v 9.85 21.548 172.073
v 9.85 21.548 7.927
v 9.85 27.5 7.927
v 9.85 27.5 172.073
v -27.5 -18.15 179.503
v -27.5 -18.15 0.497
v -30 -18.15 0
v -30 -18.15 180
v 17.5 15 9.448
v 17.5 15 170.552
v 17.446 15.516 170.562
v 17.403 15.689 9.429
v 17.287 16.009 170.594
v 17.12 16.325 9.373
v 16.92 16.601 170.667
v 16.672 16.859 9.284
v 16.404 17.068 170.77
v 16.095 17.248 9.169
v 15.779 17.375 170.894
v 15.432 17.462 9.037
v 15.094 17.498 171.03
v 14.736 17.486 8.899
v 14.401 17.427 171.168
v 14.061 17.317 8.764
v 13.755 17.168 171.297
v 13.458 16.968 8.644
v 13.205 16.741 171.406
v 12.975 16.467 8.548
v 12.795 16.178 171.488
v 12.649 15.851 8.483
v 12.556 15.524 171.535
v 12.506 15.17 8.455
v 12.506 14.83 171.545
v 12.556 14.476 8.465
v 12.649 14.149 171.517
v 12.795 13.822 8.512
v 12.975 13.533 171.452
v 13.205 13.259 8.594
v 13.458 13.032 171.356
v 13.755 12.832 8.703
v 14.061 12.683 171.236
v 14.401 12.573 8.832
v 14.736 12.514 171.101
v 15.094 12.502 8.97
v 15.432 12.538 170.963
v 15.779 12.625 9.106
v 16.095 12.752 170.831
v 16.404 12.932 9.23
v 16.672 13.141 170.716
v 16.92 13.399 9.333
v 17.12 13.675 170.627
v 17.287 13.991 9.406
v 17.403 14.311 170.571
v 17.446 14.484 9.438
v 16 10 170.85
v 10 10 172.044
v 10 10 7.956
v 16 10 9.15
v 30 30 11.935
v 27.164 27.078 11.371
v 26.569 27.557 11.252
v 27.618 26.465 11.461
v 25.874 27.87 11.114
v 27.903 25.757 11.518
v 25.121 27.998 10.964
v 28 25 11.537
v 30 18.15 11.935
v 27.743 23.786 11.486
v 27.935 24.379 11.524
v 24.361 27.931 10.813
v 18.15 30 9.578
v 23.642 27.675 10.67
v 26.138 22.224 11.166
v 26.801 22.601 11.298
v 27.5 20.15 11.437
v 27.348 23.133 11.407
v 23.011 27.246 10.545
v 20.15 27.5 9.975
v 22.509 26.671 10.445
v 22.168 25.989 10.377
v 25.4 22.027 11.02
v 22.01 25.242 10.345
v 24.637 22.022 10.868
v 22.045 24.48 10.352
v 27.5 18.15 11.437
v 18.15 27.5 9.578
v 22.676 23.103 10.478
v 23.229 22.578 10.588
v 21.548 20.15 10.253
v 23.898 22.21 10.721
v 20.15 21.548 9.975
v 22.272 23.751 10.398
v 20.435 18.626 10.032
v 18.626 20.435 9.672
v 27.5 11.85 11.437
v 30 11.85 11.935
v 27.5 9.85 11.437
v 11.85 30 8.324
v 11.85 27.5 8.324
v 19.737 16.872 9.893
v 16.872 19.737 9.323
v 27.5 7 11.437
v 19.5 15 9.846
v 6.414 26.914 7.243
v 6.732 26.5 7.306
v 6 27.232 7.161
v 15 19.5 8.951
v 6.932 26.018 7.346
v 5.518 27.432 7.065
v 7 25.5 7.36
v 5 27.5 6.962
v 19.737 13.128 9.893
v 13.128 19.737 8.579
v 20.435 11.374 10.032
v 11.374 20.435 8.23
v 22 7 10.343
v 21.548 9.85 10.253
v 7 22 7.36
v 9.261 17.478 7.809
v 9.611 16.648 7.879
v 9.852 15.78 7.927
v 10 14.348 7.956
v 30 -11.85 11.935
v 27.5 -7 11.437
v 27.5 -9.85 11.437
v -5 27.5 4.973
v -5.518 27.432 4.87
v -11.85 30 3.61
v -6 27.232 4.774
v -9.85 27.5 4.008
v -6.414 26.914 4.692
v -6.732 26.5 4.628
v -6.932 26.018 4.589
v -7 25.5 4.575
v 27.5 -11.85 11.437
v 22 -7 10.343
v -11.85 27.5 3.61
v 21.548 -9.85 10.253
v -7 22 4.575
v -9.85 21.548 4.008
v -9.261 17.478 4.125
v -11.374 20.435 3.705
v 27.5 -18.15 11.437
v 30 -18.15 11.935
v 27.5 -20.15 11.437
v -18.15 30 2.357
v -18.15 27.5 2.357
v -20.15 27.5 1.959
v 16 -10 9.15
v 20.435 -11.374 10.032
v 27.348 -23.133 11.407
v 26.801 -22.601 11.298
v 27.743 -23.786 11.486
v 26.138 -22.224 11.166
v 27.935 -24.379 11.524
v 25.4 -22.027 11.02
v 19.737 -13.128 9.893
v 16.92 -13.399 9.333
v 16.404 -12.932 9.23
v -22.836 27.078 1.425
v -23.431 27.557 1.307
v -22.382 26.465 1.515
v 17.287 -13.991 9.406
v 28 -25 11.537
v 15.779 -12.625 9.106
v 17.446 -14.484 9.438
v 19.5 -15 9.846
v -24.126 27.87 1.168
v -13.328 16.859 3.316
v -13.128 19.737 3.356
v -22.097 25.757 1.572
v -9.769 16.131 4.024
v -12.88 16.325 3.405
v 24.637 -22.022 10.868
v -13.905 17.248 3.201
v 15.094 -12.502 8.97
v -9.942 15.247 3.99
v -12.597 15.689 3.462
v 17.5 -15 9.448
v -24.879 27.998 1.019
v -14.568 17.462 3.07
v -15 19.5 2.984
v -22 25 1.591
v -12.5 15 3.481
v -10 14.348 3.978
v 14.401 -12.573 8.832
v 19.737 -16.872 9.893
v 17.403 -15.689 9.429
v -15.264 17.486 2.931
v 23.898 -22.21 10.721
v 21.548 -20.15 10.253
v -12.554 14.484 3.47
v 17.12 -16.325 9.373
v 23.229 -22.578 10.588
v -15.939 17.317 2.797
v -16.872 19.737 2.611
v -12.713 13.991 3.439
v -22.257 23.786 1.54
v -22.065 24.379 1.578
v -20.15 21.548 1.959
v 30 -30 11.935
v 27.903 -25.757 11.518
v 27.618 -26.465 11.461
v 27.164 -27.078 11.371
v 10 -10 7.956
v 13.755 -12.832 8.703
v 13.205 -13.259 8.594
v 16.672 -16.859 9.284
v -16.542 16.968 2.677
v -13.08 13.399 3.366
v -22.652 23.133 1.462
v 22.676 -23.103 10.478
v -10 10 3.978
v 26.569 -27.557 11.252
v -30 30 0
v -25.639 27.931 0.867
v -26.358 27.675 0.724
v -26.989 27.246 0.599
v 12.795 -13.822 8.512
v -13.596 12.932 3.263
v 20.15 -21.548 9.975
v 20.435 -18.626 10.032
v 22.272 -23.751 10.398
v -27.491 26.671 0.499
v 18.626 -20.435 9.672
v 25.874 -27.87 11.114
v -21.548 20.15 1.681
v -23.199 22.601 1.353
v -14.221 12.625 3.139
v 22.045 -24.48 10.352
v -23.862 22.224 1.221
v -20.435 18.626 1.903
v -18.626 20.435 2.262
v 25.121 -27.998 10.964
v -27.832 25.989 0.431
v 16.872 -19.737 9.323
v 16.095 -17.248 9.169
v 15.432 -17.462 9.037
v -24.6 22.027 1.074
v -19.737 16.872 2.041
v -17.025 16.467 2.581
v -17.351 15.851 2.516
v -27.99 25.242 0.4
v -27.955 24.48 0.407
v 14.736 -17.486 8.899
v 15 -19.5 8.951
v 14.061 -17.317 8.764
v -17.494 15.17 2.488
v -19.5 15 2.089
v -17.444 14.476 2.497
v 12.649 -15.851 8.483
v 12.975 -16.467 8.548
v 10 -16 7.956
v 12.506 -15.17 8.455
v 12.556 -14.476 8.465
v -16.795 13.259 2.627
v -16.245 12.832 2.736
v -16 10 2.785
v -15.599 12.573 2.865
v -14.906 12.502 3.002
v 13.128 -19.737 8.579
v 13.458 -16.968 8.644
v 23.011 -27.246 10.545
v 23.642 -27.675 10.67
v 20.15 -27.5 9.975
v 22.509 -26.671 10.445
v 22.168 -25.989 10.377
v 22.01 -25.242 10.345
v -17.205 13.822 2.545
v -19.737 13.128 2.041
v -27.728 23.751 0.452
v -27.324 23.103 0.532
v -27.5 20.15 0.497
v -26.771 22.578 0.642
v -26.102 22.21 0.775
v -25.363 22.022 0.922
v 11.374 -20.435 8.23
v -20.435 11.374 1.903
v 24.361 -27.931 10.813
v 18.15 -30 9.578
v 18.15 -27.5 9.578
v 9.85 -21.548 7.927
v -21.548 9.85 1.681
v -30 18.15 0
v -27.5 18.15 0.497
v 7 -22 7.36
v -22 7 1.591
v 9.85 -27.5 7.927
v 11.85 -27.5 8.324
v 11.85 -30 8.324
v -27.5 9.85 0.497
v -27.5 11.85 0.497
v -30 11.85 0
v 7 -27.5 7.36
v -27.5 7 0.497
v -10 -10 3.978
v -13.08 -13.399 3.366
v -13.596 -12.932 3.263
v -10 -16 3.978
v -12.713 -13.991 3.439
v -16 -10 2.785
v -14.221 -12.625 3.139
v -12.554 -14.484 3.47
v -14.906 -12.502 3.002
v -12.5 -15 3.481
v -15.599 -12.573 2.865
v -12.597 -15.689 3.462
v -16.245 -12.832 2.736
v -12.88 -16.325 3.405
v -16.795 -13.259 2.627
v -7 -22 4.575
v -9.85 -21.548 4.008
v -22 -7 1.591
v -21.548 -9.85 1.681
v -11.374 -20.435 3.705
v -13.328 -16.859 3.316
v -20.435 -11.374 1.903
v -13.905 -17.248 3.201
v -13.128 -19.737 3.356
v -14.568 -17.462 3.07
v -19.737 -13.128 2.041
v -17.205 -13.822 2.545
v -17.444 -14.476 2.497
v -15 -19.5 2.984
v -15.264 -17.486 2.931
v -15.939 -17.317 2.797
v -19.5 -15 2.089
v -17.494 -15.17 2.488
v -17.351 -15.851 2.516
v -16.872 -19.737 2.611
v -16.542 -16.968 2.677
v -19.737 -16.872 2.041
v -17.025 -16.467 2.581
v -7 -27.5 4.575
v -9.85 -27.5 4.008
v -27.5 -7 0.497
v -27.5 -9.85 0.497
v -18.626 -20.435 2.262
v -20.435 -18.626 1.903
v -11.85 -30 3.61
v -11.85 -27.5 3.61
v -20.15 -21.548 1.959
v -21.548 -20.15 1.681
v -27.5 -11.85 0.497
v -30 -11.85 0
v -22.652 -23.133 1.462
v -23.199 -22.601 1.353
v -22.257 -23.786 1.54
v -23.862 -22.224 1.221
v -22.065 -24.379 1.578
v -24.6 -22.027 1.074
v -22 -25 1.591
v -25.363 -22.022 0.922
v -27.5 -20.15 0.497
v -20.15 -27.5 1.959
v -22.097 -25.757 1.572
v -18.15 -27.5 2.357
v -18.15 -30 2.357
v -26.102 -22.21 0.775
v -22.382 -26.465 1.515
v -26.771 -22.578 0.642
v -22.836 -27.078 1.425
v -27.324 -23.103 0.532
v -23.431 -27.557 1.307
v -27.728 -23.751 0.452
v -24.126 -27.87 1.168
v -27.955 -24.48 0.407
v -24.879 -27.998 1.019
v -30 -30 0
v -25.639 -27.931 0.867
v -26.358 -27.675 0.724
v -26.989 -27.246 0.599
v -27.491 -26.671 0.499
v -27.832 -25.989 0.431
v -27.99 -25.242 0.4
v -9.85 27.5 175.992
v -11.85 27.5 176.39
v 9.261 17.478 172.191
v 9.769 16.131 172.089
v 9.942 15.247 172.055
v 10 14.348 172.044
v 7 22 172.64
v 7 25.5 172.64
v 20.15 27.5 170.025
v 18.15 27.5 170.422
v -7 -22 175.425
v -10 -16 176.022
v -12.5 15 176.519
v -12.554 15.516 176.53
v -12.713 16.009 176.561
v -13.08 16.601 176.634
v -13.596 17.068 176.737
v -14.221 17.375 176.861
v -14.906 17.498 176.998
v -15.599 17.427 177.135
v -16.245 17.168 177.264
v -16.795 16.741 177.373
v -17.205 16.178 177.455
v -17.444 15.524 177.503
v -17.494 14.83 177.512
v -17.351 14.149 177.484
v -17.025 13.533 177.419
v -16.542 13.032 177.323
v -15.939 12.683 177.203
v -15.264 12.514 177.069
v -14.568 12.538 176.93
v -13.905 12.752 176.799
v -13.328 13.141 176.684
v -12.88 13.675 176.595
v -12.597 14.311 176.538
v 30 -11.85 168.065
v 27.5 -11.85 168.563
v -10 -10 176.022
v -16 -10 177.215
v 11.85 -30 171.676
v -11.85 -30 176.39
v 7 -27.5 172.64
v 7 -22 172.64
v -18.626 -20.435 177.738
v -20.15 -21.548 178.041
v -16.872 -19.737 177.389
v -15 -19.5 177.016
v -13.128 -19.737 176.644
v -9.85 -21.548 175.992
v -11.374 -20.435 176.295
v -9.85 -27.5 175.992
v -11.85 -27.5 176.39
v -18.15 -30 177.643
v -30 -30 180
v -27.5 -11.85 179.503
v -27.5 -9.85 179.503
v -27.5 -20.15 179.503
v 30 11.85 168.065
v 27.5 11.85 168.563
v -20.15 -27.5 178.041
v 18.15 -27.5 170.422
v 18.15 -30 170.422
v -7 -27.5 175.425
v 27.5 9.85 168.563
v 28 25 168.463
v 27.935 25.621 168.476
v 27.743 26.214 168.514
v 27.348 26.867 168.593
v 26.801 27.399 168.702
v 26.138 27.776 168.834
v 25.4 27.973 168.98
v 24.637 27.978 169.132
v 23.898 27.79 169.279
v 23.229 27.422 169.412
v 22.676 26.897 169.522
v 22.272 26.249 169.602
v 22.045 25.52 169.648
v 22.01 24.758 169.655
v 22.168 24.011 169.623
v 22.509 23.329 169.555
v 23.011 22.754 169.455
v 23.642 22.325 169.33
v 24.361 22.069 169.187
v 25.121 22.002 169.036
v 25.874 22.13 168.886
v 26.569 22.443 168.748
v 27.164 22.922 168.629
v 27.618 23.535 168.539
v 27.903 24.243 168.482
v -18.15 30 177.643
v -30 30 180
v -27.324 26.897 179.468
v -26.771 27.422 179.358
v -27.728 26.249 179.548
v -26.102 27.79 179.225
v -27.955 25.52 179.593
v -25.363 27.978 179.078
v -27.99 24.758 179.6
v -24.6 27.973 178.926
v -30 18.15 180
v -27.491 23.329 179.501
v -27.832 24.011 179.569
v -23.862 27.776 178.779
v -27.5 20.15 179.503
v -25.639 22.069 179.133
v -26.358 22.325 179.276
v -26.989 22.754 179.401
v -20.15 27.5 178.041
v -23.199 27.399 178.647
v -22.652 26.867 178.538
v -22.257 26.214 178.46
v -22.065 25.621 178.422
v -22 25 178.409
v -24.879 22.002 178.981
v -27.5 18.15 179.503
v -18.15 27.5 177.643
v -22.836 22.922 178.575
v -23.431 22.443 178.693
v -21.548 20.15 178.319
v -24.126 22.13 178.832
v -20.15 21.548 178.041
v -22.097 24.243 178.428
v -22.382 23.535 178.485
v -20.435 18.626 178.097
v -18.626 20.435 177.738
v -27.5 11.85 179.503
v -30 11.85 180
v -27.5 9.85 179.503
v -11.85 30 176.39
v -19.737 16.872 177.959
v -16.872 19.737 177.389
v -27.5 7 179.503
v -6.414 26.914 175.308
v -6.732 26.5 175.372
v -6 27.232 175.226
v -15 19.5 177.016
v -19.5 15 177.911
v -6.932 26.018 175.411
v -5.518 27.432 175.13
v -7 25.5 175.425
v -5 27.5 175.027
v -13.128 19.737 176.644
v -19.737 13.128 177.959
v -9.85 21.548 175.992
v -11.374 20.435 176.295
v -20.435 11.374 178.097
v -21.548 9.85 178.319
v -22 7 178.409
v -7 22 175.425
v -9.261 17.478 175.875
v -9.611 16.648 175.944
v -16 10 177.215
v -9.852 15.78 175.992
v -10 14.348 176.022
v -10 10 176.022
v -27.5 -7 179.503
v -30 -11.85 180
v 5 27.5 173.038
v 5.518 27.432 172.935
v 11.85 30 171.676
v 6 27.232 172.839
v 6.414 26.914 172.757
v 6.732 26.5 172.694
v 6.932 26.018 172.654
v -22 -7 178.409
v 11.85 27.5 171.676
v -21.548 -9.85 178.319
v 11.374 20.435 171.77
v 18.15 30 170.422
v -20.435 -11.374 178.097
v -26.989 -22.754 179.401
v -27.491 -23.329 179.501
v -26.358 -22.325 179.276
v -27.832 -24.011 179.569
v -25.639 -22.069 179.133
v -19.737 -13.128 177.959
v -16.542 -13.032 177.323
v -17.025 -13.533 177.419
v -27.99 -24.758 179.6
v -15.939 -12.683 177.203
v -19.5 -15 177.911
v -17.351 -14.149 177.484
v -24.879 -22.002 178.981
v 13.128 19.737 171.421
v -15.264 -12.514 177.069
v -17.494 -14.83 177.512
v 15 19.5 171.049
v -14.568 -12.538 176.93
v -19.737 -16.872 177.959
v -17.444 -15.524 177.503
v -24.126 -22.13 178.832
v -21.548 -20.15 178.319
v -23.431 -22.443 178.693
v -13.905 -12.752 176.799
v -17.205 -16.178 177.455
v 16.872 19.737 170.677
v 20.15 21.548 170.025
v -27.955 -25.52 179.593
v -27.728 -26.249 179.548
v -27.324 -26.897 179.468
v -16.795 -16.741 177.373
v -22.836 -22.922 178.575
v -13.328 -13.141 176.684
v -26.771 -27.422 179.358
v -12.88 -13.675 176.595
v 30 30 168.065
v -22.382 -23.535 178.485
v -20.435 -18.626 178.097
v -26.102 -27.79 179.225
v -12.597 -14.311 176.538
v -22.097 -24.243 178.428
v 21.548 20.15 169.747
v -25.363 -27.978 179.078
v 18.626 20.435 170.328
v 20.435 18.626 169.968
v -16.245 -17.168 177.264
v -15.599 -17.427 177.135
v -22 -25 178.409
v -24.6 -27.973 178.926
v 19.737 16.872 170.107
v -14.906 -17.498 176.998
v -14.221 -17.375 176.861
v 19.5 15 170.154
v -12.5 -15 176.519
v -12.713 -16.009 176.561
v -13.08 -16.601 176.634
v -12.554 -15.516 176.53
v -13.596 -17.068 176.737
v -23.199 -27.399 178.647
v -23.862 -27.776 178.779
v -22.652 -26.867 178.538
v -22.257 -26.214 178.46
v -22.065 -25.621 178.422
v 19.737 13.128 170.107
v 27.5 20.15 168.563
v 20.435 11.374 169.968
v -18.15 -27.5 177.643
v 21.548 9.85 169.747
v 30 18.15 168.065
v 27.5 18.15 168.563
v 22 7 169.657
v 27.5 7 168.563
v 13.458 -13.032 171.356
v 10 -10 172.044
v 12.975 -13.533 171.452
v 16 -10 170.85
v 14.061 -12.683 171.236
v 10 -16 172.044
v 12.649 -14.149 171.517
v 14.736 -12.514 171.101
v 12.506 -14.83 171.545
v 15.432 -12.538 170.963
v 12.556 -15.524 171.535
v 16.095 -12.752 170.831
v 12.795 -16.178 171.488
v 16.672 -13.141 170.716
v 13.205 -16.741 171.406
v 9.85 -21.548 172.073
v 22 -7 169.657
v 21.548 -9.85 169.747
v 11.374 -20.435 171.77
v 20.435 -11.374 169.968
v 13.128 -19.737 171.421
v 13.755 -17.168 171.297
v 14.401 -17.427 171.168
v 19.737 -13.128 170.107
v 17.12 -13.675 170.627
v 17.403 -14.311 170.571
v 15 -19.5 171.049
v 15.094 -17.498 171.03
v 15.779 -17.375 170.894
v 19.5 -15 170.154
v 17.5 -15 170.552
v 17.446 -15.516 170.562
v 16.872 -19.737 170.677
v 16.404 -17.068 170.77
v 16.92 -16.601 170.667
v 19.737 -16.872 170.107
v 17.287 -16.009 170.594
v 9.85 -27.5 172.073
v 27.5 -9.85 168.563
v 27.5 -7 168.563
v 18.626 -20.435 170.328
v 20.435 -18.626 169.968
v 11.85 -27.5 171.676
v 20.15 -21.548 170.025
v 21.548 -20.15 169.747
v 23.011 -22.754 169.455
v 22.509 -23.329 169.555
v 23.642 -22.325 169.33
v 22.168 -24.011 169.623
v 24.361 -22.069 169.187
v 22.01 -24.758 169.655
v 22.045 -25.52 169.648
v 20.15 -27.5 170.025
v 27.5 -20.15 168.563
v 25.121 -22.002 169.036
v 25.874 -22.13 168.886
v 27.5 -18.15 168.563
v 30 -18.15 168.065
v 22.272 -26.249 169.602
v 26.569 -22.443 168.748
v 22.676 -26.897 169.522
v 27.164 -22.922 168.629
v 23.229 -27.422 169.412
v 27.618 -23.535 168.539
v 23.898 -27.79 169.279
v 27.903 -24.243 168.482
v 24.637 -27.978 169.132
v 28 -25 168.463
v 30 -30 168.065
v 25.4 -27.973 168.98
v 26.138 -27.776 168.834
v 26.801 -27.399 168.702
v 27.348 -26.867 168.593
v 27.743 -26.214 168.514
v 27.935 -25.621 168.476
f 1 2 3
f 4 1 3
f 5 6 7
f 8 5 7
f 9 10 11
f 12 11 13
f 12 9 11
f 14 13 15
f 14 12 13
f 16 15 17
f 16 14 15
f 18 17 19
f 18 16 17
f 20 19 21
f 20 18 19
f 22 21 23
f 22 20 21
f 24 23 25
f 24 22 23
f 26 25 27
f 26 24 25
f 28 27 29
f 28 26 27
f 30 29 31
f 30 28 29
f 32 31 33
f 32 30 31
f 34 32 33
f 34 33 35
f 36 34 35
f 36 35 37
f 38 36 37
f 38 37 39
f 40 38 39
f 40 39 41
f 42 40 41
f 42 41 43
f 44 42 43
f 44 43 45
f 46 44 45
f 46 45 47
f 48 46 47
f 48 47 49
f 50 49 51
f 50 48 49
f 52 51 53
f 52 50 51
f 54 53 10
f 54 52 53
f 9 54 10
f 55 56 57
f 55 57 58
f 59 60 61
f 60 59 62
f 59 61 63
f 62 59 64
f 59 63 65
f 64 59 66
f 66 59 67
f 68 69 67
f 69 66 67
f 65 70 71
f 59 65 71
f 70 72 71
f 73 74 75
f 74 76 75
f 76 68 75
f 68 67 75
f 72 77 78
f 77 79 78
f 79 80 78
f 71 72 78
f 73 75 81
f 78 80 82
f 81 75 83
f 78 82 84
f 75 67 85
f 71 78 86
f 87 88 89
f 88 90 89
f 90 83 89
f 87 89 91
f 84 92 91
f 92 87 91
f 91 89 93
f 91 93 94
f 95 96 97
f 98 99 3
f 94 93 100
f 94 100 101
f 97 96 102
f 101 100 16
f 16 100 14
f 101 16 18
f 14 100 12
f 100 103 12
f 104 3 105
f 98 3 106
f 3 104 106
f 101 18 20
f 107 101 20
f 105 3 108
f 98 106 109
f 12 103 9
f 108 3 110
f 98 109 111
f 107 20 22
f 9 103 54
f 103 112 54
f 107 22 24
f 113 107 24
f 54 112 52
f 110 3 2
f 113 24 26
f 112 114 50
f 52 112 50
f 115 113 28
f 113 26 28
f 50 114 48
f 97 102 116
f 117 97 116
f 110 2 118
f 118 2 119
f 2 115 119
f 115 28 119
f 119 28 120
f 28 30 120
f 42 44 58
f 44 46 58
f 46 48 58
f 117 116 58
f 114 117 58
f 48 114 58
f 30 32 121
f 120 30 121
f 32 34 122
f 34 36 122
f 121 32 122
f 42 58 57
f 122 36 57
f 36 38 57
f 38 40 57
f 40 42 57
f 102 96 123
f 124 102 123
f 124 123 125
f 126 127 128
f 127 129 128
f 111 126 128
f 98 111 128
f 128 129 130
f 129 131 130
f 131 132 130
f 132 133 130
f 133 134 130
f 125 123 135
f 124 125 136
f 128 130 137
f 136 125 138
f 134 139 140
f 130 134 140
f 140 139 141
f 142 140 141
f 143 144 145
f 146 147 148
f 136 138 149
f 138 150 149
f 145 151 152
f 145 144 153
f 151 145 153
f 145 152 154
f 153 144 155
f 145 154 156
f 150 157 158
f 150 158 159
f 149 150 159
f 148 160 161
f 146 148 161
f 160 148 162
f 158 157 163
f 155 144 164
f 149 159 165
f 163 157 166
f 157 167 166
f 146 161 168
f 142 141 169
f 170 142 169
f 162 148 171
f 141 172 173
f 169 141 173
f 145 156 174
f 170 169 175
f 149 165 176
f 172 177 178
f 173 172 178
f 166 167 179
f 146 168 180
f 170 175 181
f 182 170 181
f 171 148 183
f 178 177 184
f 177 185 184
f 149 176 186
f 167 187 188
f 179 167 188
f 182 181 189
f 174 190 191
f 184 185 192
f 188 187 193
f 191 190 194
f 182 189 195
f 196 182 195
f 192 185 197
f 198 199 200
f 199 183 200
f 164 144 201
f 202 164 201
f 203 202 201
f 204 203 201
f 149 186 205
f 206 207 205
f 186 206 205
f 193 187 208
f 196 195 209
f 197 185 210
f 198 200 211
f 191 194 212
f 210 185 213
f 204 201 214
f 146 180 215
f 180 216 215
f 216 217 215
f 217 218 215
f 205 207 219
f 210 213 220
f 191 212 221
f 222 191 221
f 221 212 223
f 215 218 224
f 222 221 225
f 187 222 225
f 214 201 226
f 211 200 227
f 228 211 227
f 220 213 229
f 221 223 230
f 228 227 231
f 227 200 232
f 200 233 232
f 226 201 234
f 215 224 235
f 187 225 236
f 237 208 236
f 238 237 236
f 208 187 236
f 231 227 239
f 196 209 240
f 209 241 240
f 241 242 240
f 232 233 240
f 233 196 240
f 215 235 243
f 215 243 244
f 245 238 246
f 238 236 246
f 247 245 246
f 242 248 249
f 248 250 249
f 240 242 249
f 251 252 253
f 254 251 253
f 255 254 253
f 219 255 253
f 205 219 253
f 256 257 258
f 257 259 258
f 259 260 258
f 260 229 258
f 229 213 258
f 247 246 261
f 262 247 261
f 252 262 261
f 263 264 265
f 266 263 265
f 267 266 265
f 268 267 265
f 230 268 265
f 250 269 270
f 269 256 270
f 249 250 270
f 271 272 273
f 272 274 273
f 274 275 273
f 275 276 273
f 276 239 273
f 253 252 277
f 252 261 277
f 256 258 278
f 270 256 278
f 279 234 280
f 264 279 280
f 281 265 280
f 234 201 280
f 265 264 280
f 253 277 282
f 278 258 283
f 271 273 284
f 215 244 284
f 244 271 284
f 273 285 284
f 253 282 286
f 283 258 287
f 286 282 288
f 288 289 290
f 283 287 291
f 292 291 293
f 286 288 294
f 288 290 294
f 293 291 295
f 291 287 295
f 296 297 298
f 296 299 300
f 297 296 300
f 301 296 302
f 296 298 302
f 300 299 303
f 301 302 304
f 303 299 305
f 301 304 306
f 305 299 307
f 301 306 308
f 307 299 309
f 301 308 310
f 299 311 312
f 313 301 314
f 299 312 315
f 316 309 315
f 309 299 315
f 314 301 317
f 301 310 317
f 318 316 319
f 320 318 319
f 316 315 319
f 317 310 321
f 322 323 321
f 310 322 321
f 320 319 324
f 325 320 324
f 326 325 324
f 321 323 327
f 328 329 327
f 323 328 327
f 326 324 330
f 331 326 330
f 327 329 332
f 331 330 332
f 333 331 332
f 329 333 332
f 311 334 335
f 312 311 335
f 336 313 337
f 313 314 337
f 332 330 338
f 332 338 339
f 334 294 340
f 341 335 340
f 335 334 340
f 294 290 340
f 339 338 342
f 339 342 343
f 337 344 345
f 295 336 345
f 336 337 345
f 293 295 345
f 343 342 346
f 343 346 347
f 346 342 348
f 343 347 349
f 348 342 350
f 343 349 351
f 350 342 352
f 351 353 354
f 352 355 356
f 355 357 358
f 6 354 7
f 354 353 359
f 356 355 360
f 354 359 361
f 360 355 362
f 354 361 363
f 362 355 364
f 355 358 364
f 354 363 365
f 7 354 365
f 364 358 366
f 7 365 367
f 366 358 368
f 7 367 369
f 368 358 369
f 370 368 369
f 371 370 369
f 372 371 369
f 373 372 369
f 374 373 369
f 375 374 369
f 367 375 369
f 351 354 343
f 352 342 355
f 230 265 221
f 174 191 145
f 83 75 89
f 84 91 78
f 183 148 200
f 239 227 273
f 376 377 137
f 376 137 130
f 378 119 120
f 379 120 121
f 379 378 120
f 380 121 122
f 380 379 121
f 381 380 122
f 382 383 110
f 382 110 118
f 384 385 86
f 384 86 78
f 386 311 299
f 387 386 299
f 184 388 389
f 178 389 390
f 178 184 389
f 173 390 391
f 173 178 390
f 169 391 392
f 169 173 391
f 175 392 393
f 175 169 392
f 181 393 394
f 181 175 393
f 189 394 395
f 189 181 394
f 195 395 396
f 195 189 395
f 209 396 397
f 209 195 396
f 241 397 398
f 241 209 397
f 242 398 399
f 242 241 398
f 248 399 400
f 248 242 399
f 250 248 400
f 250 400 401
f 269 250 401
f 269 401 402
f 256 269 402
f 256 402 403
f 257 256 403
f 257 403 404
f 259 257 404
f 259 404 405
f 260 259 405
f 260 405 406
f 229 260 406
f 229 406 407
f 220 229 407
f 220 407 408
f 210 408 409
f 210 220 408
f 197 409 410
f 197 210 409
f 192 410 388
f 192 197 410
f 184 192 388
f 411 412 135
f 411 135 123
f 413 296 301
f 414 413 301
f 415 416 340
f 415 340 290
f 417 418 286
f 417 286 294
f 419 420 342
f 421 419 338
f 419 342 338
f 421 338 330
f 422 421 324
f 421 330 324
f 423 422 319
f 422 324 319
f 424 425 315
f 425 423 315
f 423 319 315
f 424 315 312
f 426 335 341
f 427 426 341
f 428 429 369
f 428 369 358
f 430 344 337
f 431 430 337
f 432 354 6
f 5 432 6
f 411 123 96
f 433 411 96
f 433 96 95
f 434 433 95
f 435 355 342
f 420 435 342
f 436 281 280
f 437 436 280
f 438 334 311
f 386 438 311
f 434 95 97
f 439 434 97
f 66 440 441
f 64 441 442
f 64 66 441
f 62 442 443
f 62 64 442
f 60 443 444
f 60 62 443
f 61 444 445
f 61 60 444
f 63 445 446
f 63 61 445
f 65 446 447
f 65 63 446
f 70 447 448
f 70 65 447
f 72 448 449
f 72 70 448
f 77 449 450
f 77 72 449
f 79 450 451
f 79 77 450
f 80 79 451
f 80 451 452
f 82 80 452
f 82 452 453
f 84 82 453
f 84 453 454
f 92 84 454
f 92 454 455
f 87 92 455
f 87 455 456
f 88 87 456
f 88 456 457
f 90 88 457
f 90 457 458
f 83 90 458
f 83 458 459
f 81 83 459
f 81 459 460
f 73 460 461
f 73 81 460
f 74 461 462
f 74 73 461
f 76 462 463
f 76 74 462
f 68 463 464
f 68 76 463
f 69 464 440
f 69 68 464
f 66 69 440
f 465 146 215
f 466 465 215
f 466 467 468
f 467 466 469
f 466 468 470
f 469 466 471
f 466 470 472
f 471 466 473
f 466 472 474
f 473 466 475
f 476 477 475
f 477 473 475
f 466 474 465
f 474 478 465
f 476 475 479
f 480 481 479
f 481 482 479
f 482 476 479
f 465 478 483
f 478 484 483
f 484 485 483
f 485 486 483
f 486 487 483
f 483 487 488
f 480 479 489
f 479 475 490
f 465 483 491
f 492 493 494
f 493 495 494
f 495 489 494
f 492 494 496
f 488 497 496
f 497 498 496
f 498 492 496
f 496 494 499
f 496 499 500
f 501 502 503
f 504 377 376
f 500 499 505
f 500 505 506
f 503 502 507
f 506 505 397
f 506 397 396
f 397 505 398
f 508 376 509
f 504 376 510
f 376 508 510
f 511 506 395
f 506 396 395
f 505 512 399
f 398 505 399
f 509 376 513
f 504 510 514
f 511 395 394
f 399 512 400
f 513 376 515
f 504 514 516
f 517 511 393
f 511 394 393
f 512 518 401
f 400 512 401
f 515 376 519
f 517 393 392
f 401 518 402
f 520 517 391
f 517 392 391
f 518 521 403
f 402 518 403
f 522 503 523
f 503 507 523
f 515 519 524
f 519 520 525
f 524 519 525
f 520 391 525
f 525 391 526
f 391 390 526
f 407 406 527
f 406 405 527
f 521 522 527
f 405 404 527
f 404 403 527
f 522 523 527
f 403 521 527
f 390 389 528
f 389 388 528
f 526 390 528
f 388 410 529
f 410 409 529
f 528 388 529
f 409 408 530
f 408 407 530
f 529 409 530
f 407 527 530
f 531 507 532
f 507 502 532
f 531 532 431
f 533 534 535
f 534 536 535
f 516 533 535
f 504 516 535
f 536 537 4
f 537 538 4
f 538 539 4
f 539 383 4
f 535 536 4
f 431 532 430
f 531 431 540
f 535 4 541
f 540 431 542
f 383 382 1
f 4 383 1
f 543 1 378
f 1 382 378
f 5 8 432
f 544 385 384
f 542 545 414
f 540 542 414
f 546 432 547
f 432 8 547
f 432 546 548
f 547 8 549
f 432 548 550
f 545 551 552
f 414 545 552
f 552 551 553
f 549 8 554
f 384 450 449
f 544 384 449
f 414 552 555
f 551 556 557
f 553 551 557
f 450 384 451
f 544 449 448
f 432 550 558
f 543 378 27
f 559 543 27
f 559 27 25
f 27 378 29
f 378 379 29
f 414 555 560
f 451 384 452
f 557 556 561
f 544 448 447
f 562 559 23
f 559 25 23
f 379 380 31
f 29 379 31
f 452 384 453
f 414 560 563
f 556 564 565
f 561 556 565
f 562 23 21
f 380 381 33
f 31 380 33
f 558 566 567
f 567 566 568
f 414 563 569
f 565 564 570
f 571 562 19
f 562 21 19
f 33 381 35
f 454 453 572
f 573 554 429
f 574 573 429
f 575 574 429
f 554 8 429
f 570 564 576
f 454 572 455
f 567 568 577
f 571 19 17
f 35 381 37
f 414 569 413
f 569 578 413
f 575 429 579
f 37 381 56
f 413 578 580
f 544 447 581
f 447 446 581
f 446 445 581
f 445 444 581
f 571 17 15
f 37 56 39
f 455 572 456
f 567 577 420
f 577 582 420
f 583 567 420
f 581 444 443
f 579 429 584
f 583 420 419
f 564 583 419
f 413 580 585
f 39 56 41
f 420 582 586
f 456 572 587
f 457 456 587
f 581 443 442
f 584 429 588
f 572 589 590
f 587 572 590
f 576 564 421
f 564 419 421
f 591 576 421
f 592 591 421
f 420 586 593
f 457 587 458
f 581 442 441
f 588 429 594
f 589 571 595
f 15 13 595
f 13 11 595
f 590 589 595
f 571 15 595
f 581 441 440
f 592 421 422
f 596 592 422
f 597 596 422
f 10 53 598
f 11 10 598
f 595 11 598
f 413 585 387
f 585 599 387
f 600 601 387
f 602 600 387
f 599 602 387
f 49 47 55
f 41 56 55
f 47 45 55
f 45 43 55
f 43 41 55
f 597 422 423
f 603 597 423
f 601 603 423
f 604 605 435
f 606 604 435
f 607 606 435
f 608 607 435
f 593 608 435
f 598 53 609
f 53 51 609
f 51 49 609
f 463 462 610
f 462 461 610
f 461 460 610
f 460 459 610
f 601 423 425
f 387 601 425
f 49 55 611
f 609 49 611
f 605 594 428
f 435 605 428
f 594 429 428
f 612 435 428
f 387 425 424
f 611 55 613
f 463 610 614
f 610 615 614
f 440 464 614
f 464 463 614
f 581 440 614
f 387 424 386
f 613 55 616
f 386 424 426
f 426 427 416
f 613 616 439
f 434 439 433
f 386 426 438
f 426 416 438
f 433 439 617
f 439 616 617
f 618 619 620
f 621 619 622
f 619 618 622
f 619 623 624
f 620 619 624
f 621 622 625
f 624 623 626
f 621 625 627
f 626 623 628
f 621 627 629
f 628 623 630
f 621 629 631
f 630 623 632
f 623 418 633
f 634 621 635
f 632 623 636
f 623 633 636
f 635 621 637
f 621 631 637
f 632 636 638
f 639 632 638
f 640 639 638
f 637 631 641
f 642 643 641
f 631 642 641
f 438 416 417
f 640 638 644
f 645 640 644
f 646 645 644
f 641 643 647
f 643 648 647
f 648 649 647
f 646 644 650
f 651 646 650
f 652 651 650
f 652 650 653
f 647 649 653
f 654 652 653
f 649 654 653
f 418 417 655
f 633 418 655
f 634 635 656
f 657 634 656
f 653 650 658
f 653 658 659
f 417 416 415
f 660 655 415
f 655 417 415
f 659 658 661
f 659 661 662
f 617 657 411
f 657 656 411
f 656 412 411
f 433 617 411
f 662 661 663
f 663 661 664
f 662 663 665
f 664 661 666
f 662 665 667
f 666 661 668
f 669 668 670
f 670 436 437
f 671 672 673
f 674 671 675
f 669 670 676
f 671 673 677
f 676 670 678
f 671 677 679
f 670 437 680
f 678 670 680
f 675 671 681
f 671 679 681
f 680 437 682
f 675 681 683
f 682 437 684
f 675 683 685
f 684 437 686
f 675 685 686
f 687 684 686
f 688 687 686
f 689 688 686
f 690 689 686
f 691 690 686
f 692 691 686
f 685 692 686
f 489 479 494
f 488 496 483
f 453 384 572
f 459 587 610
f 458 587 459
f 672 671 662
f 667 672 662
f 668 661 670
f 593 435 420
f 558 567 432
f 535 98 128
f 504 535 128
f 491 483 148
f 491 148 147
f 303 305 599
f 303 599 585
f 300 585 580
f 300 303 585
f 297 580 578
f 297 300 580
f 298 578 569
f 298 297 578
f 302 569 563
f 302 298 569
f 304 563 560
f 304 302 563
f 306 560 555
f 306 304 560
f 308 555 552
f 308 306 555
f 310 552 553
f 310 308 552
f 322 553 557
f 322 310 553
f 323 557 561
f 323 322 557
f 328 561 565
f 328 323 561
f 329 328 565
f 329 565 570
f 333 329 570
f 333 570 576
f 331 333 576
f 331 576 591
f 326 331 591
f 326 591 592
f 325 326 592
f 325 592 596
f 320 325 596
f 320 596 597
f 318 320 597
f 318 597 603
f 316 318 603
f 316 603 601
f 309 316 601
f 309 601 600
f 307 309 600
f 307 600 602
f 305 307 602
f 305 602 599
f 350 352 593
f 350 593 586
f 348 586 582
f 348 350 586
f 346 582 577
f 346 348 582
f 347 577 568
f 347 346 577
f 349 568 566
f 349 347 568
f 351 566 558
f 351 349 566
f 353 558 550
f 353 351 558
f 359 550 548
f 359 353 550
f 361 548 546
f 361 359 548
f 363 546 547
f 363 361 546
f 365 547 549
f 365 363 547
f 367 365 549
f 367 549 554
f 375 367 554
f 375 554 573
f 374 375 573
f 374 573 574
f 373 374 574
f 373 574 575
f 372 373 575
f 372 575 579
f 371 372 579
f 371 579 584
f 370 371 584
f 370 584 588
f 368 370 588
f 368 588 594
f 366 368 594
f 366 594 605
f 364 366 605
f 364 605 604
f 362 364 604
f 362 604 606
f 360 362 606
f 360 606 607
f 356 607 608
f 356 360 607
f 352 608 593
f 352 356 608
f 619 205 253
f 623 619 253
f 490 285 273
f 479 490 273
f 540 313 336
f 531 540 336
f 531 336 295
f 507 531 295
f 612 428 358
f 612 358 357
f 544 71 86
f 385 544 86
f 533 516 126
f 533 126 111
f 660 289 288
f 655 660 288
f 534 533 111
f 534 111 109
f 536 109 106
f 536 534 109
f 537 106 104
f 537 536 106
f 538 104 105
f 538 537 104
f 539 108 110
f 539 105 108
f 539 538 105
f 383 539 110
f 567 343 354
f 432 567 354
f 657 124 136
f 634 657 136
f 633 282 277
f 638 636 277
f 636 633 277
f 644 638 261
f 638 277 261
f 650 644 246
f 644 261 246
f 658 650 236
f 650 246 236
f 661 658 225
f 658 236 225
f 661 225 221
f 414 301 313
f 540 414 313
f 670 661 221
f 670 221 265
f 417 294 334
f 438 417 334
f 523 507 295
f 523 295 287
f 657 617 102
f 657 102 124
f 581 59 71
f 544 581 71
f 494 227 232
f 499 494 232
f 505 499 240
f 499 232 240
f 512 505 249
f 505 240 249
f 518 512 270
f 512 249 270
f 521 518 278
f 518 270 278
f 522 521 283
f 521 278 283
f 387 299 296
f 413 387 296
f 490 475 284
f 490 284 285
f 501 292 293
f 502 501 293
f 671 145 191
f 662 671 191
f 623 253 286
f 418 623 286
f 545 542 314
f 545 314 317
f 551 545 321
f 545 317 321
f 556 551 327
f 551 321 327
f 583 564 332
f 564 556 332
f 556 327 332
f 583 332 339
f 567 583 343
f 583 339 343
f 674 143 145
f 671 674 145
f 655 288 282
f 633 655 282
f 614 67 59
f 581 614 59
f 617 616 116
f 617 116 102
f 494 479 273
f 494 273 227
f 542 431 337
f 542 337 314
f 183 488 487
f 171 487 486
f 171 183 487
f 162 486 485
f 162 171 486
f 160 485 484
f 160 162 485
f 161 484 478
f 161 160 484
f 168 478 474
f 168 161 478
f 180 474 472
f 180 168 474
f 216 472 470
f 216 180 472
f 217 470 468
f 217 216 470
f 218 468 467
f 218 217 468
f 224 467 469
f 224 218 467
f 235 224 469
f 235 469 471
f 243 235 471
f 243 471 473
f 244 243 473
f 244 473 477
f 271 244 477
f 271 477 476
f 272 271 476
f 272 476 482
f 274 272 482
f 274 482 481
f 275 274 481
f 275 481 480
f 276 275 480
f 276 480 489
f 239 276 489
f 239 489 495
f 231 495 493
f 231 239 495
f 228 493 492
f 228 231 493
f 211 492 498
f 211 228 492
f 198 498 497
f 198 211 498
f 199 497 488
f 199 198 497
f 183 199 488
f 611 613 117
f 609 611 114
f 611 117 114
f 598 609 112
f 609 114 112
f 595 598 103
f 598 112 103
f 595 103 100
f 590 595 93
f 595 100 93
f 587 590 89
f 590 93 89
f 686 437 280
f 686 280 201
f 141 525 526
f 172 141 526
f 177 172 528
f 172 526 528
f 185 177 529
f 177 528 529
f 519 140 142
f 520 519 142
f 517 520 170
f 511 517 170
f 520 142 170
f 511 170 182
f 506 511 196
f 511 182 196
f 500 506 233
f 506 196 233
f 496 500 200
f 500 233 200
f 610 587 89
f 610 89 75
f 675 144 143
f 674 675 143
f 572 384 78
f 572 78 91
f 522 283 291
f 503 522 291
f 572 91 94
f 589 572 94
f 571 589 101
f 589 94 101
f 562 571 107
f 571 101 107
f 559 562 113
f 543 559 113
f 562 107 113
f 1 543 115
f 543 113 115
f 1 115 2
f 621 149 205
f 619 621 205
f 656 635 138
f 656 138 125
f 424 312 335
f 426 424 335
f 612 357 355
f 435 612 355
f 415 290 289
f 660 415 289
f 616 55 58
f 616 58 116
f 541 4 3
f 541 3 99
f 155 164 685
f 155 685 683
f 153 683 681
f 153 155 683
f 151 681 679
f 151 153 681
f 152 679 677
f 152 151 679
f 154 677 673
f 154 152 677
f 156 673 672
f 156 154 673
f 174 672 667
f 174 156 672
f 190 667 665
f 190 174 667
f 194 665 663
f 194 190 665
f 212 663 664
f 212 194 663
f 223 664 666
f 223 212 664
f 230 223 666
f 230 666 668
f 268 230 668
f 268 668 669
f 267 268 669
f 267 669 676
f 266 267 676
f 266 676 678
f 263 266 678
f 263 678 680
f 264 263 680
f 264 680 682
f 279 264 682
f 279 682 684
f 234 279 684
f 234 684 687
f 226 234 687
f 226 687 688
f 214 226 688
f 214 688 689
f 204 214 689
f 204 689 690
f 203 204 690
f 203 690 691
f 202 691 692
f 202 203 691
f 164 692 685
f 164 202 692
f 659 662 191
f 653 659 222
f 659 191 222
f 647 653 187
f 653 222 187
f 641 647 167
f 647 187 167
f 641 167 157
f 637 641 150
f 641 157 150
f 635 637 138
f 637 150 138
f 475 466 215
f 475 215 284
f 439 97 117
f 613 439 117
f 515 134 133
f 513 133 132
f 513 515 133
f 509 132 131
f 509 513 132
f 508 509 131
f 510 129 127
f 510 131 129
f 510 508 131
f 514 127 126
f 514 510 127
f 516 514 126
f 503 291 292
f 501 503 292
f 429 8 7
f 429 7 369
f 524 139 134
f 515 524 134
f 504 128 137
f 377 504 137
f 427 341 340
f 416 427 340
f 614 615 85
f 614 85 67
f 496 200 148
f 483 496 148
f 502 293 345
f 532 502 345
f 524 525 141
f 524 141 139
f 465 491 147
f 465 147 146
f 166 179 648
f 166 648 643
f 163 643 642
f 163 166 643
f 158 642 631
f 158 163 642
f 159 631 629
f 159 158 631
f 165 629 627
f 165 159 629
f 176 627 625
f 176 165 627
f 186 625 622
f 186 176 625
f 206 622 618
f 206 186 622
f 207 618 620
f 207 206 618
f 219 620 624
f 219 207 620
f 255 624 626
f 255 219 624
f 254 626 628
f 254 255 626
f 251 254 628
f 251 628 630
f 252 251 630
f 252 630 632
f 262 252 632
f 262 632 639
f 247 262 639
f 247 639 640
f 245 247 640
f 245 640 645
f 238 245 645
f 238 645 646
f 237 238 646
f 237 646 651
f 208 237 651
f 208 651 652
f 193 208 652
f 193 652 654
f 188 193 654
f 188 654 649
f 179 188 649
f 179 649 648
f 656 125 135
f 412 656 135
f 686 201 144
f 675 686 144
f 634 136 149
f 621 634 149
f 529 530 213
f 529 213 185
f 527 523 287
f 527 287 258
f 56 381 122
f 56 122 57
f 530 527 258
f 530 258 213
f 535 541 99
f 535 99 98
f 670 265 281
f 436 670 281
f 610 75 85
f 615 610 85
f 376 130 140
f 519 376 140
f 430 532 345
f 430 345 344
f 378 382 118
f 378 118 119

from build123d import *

# Parameters (mm, degrees)
F0_R          = 3
F0_R_2        = 2.5
F1_DEPTH      = 180
F2_R          = 2
F3_R          = 7
F6_DEPTH      = 30
F6_DEPTH_BACK = 30


# Not quite as in the source:
# - a feature names something its author has since deleted; it is built from what else it names


with BuildPart() as f1:
    # F0 (on Top) → F1 (new body)
    with BuildSketch(Plane.XY):
        with BuildLine():
            Line((18.15, -30), (30, -30))
            Line((30, -30), (30, -18.15))
            Line((30, -18.15), (27.5, -18.15))
            Line((27.5, -18.15), (27.5, -20.15))
            Line((27.5, -20.15), (21.5477069044, -20.15))
            ThreePointArc((21.5477069044, -20.15), (19.5, -15), (21.5477069044, -9.85))
            Line((21.5477069044, -9.85), (27.5, -9.85))
            Line((27.5, -9.85), (27.5, -11.85))
            Line((27.5, -11.85), (30, -11.85))
            Line((30, -11.85), (30, 11.85))
            Line((30, 11.85), (27.5, 11.85))
            Line((27.5, 11.85), (27.5, 9.85))
            Line((27.5, 9.85), (21.5477069044, 9.85))
            ThreePointArc((21.5477069044, 9.85), (19.5, 15), (21.5477069044, 20.15))
            Line((21.5477069044, 20.15), (27.5, 20.15))
            Line((27.5, 20.15), (27.5, 18.15))
            Line((27.5, 18.15), (30, 18.15))
            Line((30, 18.15), (30, 30))
            Line((30, 30), (18.15, 30))
            Line((18.15, 30), (18.15, 27.5))
            Line((18.15, 27.5), (20.15, 27.5))
            Line((20.15, 27.5), (20.15, 21.5477069044))
            ThreePointArc((20.15, 21.5477069044), (15, 19.5), (9.85, 21.5477069044))
            Line((9.85, 21.5477069044), (9.85, 27.5))
            Line((9.85, 27.5), (11.85, 27.5))
            Line((11.85, 27.5), (11.85, 30))
            Line((11.85, 30), (-11.85, 30))
            Line((-11.85, 30), (-11.85, 27.5))
            Line((-11.85, 27.5), (-9.85, 27.5))
            Line((-9.85, 27.5), (-9.85, 21.5477069044))
            ThreePointArc((-9.85, 21.5477069044), (-15, 19.5), (-20.15, 21.5477069044))
            Line((-20.15, 21.5477069044), (-20.15, 27.5))
            Line((-20.15, 27.5), (-18.15, 27.5))
            Line((-18.15, 27.5), (-18.15, 30))
            Line((-18.15, 30), (-30, 30))
            Line((-30, 30), (-30, 18.15))
            Line((-30, 18.15), (-27.5, 18.15))
            Line((-27.5, 18.15), (-27.5, 20.15))
            Line((-27.5, 20.15), (-21.5477069044, 20.15))
            ThreePointArc((-21.5477069044, 20.15), (-19.5, 15), (-21.5477069044, 9.85))
            Line((-21.5477069044, 9.85), (-27.5, 9.85))
            Line((-27.5, 9.85), (-27.5, 11.85))
            Line((-27.5, 11.85), (-30, 11.85))
            Line((-30, 11.85), (-30, -11.85))
            Line((-30, -11.85), (-27.5, -11.85))
            Line((-27.5, -11.85), (-27.5, -9.85))
            Line((-27.5, -9.85), (-21.5477069044, -9.85))
            ThreePointArc((-21.5477069044, -9.85), (-19.5, -15), (-21.5477069044, -20.15))
            Line((-21.5477069044, -20.15), (-27.5, -20.15))
            Line((-27.5, -20.15), (-27.5, -18.15))
            Line((-27.5, -18.15), (-30, -18.15))
            Line((-30, -18.15), (-30, -30))
            Line((-30, -30), (-18.15, -30))
            Line((-18.15, -30), (-18.15, -27.5))
            Line((-18.15, -27.5), (-20.15, -27.5))
            Line((-20.15, -27.5), (-20.15, -21.5477069044))
            ThreePointArc((-20.15, -21.5477069044), (-15, -19.5), (-9.85, -21.5477069044))
            Line((-9.85, -21.5477069044), (-9.85, -27.5))
            Line((-9.85, -27.5), (-11.85, -27.5))
            Line((-11.85, -27.5), (-11.85, -30))
            Line((-11.85, -30), (11.85, -30))
            Line((11.85, -30), (11.85, -27.5))
            Line((11.85, -27.5), (9.85, -27.5))
            Line((9.85, -27.5), (9.85, -21.5477069044))
            ThreePointArc((9.85, -21.5477069044), (15, -19.5), (20.15, -21.5477069044))
            Line((20.15, -21.5477069044), (20.15, -27.5))
            Line((20.15, -27.5), (18.15, -27.5))
            Line((18.15, -27.5), (18.15, -30))
        make_face()
        with Locations((-25, -25)):
            Circle(F0_R, mode=Mode.SUBTRACT)
        with Locations((-15, -15)):
            Circle(F0_R_2, mode=Mode.SUBTRACT)
        with Locations((25, -25)):
            Circle(F0_R, mode=Mode.SUBTRACT)
        with Locations((15, -15)):
            Circle(F0_R_2, mode=Mode.SUBTRACT)
        with Locations((-25, 25)):
            Circle(F0_R, mode=Mode.SUBTRACT)
        with Locations((-15, 15)):
            Circle(F0_R_2, mode=Mode.SUBTRACT)
        Polygon((-7, 22), (-7, 27.5), (0, 27.5), (7, 27.5), (7, 22), (10, 16), (10, 10), (16, 10), (22, 7), (27.5, 7), (27.5, 0), (27.5, -7), (22, -7), (16, -10), (10, -10), (10, -16), (7, -22), (7, -27.5), (0, -27.5), (-7, -27.5), (-7, -22), (-10, -16), (-10, -10), (-16, -10), (-22, -7), (-27.5, -7), (-27.5, 0), (-27.5, 7), (-22, 7), (-16, 10), (-10, 10), (-10, 16), align=None, mode=Mode.SUBTRACT)
        with Locations((15, 15)):
            Circle(F0_R_2, mode=Mode.SUBTRACT)
        with Locations((25, 25)):
            Circle(F0_R, mode=Mode.SUBTRACT)
    extrude(amount=F1_DEPTH)

    # F2
    f2_edges = [f1.edges().sort_by_distance(p)[0] for p in [
        (-7, 27.5, 90),
        (7, 27.5, 90),
    ]]
    fillet(f2_edges, radius=F2_R)

    # F3
    f3_edges = [f1.edges().sort_by_distance(p)[0] for p in [
        (-10, 16, 90),
        (10, 16, 90),
    ]]
    fillet(f3_edges, radius=F3_R)

    # F5 (on Front) → F6 (cut, two sides)
    with BuildSketch(Plane.XZ) as f6_sk:
        Polygon((79.680713533, 21.8168503847), (-30, 0), (-17.5886362159, -62.3961393031), (92.0920773171, -40.5792889183), align=None)
        Polygon((97.6667223127, 202.7474358776), (-20.7884412878, 226.3096328978), (-30, 180), (88.4551636005, 156.4378029799), align=None)
    extrude(amount=F6_DEPTH, mode=Mode.SUBTRACT)
    extrude(f6_sk.sketch, amount=-F6_DEPTH_BACK, mode=Mode.SUBTRACT)


solid = f1.part
